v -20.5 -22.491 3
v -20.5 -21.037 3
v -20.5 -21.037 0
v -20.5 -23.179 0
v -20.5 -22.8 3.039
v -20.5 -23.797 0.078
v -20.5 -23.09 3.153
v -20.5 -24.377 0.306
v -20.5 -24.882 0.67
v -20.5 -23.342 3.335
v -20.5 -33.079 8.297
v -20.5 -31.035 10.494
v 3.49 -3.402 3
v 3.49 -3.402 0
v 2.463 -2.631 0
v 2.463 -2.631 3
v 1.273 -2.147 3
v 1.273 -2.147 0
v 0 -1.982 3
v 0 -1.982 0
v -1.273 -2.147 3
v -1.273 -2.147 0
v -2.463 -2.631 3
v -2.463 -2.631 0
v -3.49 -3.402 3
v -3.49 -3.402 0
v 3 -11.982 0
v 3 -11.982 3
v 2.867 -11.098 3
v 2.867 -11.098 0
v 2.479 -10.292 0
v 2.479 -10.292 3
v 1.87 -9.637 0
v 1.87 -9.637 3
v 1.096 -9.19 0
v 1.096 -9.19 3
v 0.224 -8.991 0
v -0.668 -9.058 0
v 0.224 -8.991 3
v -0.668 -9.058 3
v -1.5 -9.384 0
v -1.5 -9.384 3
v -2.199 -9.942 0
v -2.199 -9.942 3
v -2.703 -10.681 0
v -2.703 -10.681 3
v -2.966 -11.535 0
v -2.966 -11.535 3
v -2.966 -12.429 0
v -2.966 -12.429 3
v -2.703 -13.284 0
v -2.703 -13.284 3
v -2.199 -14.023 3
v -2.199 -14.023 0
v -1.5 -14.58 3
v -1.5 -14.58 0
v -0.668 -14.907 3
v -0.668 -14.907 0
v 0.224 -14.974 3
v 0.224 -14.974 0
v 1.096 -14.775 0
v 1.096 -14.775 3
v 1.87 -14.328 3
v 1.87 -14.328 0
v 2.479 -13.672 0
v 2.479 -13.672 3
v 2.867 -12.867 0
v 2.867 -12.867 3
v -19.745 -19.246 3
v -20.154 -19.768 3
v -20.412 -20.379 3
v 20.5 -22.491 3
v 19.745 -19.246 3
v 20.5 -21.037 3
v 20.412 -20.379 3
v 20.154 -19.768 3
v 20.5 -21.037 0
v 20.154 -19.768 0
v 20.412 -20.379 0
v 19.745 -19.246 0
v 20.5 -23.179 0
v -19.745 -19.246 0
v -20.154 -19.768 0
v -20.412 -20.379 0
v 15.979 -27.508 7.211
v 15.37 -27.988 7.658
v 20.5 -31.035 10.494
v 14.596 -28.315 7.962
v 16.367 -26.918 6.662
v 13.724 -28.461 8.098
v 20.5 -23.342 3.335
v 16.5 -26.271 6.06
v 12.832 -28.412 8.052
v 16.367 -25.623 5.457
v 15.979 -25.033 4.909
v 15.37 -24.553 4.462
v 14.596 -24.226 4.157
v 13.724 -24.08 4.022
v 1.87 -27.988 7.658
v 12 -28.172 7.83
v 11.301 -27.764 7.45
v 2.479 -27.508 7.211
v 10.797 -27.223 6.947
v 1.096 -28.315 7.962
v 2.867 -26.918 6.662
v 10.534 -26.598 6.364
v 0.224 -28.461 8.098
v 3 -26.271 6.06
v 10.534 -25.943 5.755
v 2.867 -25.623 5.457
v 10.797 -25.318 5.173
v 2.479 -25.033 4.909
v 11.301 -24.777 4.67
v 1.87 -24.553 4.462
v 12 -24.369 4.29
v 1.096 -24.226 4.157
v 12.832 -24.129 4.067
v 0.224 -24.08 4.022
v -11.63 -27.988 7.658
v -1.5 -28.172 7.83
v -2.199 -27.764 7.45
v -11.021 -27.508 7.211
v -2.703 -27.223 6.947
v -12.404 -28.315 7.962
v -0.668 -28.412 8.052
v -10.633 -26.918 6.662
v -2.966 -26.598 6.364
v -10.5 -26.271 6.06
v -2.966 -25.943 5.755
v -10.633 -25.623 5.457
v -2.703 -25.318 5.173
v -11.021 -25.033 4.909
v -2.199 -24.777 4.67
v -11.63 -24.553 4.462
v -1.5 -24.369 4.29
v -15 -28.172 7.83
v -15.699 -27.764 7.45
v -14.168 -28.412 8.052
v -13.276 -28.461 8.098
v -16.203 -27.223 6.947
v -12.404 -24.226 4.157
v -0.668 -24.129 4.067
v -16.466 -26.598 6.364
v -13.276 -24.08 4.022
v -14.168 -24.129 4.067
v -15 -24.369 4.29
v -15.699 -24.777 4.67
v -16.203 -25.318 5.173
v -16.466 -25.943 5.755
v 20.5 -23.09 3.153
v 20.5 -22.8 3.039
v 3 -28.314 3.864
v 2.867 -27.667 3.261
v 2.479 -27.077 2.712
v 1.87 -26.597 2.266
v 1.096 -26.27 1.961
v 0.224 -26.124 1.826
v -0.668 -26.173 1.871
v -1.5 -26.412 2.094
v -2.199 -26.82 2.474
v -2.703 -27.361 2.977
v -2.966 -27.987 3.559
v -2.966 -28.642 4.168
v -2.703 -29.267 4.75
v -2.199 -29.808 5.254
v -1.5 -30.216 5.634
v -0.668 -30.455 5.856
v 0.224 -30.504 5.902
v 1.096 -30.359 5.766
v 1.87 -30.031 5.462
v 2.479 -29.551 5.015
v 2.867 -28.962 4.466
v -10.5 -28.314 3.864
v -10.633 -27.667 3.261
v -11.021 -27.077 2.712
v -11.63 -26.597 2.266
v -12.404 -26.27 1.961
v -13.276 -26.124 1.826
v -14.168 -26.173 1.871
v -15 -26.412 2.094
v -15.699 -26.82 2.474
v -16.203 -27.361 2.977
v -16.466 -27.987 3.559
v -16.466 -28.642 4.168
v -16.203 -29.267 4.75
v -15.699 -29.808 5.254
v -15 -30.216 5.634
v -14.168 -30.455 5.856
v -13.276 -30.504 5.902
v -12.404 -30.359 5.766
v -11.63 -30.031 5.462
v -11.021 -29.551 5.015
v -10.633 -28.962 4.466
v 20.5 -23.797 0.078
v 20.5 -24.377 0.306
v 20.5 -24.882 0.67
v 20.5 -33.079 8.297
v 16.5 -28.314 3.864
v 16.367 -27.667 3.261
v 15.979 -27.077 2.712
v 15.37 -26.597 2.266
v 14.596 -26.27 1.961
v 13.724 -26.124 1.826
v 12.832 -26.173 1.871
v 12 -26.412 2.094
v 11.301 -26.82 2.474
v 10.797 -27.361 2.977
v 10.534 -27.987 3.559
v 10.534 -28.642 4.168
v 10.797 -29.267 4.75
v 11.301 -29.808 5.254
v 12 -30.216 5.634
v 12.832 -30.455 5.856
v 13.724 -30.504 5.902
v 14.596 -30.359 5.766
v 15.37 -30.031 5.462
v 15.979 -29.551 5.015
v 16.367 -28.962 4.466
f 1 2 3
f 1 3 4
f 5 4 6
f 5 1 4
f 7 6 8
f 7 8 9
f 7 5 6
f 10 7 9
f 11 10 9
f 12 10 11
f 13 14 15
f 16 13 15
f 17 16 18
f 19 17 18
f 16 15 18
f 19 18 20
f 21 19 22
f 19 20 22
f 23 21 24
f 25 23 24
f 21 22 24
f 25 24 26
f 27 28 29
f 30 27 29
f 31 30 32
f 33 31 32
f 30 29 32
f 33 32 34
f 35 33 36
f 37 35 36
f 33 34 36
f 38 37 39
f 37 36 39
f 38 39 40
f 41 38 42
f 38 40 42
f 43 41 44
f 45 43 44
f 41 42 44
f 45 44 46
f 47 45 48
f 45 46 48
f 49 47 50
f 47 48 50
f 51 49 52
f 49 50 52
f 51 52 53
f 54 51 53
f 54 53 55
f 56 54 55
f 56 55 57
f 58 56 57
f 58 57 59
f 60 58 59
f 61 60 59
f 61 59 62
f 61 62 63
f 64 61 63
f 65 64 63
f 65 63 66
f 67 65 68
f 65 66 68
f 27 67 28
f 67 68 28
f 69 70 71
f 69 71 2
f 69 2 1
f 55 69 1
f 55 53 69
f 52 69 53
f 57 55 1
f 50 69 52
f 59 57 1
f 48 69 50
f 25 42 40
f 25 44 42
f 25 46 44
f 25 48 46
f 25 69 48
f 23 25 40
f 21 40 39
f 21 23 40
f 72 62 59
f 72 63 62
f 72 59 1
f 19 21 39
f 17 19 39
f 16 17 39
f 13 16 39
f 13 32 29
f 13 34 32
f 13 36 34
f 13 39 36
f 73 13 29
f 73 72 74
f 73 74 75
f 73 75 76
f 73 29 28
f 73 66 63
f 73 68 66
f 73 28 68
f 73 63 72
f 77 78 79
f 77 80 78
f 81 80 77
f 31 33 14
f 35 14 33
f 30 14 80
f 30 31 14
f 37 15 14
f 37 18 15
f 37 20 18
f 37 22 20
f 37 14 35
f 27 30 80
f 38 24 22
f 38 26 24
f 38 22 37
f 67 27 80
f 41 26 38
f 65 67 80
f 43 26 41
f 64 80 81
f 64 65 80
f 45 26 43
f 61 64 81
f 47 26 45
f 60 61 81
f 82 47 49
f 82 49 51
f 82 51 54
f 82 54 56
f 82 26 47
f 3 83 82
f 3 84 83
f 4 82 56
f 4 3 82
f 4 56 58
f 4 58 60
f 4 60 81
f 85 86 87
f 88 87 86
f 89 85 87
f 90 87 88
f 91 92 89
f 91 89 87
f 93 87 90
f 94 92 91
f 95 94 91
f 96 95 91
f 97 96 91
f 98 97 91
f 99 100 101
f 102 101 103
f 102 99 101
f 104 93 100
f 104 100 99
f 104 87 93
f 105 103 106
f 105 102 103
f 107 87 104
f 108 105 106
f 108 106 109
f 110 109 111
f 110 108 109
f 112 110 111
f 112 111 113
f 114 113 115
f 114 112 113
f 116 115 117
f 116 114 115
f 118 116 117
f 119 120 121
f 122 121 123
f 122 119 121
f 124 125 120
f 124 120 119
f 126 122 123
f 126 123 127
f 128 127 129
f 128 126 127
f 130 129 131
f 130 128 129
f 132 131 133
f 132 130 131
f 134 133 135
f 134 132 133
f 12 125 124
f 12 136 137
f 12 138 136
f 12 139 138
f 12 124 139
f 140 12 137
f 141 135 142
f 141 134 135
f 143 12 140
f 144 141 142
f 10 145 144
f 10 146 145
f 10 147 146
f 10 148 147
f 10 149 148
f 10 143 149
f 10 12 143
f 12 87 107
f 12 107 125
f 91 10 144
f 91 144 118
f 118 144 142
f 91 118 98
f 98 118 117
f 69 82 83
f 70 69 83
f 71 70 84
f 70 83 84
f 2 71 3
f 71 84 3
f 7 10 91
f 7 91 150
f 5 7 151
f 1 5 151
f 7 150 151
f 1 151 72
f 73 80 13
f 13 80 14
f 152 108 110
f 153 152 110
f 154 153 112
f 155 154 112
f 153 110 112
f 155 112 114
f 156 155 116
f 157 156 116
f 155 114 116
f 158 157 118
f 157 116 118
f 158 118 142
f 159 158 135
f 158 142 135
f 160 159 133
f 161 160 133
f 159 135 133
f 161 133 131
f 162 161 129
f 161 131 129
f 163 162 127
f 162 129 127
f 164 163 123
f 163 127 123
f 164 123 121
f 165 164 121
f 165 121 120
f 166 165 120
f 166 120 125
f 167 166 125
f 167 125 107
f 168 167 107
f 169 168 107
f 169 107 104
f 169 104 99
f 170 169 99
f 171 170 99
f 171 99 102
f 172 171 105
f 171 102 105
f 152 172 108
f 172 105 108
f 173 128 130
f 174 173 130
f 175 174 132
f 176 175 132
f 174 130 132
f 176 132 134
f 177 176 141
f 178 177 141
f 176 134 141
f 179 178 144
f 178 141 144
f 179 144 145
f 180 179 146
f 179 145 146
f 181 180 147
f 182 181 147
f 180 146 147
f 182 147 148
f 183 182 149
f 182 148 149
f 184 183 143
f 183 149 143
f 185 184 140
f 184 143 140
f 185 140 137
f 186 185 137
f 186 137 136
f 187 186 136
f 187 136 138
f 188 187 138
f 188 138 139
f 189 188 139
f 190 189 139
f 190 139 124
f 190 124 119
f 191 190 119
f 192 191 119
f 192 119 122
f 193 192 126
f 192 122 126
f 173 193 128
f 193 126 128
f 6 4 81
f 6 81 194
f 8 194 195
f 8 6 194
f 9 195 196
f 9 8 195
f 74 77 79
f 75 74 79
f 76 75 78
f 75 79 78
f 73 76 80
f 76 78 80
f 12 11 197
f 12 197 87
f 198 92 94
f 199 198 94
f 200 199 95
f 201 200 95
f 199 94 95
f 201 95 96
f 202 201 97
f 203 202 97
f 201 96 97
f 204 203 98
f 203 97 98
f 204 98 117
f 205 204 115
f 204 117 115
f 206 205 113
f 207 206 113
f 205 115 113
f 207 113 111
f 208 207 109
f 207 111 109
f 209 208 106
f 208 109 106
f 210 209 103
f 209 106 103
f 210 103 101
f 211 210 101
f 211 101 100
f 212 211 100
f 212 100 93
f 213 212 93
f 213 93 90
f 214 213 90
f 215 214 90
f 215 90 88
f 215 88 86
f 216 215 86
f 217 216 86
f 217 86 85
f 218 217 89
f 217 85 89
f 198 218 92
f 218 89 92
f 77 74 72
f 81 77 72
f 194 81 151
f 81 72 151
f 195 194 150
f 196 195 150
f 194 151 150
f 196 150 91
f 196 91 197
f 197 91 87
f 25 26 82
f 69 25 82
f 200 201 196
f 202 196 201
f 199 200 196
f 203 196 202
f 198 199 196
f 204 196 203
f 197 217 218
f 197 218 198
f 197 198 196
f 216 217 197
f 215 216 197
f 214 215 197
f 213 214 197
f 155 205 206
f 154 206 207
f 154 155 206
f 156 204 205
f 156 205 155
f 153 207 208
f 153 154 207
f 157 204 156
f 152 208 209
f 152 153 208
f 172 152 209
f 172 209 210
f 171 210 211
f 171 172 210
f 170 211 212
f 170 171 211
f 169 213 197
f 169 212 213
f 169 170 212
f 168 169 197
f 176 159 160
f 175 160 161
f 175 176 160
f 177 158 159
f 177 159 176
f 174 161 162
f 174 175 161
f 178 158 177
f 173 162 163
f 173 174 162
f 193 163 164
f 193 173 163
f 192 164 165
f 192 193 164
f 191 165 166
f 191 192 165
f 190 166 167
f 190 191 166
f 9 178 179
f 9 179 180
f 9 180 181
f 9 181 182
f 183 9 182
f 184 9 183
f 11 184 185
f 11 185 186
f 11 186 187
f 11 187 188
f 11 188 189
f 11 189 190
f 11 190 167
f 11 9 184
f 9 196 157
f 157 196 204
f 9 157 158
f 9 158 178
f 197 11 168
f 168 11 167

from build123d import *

# Parameters (mm, degrees)
F1_DEPTH = 3
F2_R     = 3
F3_DEPTH = 3
F5_DEPTH = 41
F6_R     = 1.25
F7_R     = 3
F8_DEPTH = 3


with BuildPart() as f1:
    # F0 (on Top) → F1 (new body)
    with BuildSketch(Plane.XY):
        with BuildLine():
            ThreePointArc((3.4900408275, -3.4019155104), (0, -1.9823645076), (-3.4900408275, -3.4019155104))
            Line((-3.4900408275, -3.4019155104), (-19.7450204138, -19.2464485424))
            ThreePointArc((-19.7450204138, -19.2464485424), (-20.3035354387, -20.065218213), (-20.5, -21.036673041))
            Line((-20.5, -21.036673041), (-20.5, -22.9823645076))
            Line((-20.5, -22.9823645076), (20.5, -22.9823645076))
            Line((20.5, -22.9823645076), (20.5, -21.036673041))
            ThreePointArc((20.5, -21.036673041), (20.3035354387, -20.065218213), (19.7450204138, -19.2464485424))
            Line((19.7450204138, -19.2464485424), (3.4900408275, -3.4019155104))
        make_face()
    extrude(amount=F1_DEPTH)

    # F2 (on face) → F3 (cut)
    with BuildSketch(Plane.XY.offset(3)):
        with Locations((0, -11.9823645076)):
            Circle(F2_R)
    extrude(amount=-F3_DEPTH, mode=Mode.SUBTRACT)

    # F4 (on face) → F5 (join)
    with BuildSketch(Plane(origin=(-20.5, 0, 0), x_dir=(0, -1, 0), z_dir=(-1, 0, 0))):
        with BuildLine():
            Line((31.0350133065, 10.4936538032), (22.9823645076, 3))
            Line((22.9823645076, 3), (22.9823645076, 0))
            Line((22.9823645076, 0), (23.1790209905, 0))
            ThreePointArc((23.1790209905, 0), (24.0940705422, 0.1734823624), (24.8821241276, 0.6698525457))
            Line((24.8821241276, 0.6698525457), (33.078737071, 8.2974768581))
            Line((33.078737071, 8.2974768581), (31.0350133065, 10.4936538032))
        make_face()
    extrude(amount=-F5_DEPTH)

    # F6
    f6_edges = [f1.edges().sort_by_distance(p)[0] for p in [
        (0, -22.982365, 3),
    ]]
    fillet(f6_edges, radius=F6_R)

    # F7 (on face) → F8 (cut)
    with BuildSketch(Plane(origin=(0, -9.1697511003, -9.8537758913), x_dir=(1, 0, 0), z_dir=(0, 0.6812412548, 0.7320589817))):
        with Locations((13.5, -23.3598113305)):
            Circle(F7_R)
        with Locations((0, -23.3598113305)):
            Circle(F7_R)
        with Locations((-13.5, -23.3598113305)):
            Circle(F7_R)
    extrude(amount=-F8_DEPTH, mode=Mode.SUBTRACT)


solid = f1.part
